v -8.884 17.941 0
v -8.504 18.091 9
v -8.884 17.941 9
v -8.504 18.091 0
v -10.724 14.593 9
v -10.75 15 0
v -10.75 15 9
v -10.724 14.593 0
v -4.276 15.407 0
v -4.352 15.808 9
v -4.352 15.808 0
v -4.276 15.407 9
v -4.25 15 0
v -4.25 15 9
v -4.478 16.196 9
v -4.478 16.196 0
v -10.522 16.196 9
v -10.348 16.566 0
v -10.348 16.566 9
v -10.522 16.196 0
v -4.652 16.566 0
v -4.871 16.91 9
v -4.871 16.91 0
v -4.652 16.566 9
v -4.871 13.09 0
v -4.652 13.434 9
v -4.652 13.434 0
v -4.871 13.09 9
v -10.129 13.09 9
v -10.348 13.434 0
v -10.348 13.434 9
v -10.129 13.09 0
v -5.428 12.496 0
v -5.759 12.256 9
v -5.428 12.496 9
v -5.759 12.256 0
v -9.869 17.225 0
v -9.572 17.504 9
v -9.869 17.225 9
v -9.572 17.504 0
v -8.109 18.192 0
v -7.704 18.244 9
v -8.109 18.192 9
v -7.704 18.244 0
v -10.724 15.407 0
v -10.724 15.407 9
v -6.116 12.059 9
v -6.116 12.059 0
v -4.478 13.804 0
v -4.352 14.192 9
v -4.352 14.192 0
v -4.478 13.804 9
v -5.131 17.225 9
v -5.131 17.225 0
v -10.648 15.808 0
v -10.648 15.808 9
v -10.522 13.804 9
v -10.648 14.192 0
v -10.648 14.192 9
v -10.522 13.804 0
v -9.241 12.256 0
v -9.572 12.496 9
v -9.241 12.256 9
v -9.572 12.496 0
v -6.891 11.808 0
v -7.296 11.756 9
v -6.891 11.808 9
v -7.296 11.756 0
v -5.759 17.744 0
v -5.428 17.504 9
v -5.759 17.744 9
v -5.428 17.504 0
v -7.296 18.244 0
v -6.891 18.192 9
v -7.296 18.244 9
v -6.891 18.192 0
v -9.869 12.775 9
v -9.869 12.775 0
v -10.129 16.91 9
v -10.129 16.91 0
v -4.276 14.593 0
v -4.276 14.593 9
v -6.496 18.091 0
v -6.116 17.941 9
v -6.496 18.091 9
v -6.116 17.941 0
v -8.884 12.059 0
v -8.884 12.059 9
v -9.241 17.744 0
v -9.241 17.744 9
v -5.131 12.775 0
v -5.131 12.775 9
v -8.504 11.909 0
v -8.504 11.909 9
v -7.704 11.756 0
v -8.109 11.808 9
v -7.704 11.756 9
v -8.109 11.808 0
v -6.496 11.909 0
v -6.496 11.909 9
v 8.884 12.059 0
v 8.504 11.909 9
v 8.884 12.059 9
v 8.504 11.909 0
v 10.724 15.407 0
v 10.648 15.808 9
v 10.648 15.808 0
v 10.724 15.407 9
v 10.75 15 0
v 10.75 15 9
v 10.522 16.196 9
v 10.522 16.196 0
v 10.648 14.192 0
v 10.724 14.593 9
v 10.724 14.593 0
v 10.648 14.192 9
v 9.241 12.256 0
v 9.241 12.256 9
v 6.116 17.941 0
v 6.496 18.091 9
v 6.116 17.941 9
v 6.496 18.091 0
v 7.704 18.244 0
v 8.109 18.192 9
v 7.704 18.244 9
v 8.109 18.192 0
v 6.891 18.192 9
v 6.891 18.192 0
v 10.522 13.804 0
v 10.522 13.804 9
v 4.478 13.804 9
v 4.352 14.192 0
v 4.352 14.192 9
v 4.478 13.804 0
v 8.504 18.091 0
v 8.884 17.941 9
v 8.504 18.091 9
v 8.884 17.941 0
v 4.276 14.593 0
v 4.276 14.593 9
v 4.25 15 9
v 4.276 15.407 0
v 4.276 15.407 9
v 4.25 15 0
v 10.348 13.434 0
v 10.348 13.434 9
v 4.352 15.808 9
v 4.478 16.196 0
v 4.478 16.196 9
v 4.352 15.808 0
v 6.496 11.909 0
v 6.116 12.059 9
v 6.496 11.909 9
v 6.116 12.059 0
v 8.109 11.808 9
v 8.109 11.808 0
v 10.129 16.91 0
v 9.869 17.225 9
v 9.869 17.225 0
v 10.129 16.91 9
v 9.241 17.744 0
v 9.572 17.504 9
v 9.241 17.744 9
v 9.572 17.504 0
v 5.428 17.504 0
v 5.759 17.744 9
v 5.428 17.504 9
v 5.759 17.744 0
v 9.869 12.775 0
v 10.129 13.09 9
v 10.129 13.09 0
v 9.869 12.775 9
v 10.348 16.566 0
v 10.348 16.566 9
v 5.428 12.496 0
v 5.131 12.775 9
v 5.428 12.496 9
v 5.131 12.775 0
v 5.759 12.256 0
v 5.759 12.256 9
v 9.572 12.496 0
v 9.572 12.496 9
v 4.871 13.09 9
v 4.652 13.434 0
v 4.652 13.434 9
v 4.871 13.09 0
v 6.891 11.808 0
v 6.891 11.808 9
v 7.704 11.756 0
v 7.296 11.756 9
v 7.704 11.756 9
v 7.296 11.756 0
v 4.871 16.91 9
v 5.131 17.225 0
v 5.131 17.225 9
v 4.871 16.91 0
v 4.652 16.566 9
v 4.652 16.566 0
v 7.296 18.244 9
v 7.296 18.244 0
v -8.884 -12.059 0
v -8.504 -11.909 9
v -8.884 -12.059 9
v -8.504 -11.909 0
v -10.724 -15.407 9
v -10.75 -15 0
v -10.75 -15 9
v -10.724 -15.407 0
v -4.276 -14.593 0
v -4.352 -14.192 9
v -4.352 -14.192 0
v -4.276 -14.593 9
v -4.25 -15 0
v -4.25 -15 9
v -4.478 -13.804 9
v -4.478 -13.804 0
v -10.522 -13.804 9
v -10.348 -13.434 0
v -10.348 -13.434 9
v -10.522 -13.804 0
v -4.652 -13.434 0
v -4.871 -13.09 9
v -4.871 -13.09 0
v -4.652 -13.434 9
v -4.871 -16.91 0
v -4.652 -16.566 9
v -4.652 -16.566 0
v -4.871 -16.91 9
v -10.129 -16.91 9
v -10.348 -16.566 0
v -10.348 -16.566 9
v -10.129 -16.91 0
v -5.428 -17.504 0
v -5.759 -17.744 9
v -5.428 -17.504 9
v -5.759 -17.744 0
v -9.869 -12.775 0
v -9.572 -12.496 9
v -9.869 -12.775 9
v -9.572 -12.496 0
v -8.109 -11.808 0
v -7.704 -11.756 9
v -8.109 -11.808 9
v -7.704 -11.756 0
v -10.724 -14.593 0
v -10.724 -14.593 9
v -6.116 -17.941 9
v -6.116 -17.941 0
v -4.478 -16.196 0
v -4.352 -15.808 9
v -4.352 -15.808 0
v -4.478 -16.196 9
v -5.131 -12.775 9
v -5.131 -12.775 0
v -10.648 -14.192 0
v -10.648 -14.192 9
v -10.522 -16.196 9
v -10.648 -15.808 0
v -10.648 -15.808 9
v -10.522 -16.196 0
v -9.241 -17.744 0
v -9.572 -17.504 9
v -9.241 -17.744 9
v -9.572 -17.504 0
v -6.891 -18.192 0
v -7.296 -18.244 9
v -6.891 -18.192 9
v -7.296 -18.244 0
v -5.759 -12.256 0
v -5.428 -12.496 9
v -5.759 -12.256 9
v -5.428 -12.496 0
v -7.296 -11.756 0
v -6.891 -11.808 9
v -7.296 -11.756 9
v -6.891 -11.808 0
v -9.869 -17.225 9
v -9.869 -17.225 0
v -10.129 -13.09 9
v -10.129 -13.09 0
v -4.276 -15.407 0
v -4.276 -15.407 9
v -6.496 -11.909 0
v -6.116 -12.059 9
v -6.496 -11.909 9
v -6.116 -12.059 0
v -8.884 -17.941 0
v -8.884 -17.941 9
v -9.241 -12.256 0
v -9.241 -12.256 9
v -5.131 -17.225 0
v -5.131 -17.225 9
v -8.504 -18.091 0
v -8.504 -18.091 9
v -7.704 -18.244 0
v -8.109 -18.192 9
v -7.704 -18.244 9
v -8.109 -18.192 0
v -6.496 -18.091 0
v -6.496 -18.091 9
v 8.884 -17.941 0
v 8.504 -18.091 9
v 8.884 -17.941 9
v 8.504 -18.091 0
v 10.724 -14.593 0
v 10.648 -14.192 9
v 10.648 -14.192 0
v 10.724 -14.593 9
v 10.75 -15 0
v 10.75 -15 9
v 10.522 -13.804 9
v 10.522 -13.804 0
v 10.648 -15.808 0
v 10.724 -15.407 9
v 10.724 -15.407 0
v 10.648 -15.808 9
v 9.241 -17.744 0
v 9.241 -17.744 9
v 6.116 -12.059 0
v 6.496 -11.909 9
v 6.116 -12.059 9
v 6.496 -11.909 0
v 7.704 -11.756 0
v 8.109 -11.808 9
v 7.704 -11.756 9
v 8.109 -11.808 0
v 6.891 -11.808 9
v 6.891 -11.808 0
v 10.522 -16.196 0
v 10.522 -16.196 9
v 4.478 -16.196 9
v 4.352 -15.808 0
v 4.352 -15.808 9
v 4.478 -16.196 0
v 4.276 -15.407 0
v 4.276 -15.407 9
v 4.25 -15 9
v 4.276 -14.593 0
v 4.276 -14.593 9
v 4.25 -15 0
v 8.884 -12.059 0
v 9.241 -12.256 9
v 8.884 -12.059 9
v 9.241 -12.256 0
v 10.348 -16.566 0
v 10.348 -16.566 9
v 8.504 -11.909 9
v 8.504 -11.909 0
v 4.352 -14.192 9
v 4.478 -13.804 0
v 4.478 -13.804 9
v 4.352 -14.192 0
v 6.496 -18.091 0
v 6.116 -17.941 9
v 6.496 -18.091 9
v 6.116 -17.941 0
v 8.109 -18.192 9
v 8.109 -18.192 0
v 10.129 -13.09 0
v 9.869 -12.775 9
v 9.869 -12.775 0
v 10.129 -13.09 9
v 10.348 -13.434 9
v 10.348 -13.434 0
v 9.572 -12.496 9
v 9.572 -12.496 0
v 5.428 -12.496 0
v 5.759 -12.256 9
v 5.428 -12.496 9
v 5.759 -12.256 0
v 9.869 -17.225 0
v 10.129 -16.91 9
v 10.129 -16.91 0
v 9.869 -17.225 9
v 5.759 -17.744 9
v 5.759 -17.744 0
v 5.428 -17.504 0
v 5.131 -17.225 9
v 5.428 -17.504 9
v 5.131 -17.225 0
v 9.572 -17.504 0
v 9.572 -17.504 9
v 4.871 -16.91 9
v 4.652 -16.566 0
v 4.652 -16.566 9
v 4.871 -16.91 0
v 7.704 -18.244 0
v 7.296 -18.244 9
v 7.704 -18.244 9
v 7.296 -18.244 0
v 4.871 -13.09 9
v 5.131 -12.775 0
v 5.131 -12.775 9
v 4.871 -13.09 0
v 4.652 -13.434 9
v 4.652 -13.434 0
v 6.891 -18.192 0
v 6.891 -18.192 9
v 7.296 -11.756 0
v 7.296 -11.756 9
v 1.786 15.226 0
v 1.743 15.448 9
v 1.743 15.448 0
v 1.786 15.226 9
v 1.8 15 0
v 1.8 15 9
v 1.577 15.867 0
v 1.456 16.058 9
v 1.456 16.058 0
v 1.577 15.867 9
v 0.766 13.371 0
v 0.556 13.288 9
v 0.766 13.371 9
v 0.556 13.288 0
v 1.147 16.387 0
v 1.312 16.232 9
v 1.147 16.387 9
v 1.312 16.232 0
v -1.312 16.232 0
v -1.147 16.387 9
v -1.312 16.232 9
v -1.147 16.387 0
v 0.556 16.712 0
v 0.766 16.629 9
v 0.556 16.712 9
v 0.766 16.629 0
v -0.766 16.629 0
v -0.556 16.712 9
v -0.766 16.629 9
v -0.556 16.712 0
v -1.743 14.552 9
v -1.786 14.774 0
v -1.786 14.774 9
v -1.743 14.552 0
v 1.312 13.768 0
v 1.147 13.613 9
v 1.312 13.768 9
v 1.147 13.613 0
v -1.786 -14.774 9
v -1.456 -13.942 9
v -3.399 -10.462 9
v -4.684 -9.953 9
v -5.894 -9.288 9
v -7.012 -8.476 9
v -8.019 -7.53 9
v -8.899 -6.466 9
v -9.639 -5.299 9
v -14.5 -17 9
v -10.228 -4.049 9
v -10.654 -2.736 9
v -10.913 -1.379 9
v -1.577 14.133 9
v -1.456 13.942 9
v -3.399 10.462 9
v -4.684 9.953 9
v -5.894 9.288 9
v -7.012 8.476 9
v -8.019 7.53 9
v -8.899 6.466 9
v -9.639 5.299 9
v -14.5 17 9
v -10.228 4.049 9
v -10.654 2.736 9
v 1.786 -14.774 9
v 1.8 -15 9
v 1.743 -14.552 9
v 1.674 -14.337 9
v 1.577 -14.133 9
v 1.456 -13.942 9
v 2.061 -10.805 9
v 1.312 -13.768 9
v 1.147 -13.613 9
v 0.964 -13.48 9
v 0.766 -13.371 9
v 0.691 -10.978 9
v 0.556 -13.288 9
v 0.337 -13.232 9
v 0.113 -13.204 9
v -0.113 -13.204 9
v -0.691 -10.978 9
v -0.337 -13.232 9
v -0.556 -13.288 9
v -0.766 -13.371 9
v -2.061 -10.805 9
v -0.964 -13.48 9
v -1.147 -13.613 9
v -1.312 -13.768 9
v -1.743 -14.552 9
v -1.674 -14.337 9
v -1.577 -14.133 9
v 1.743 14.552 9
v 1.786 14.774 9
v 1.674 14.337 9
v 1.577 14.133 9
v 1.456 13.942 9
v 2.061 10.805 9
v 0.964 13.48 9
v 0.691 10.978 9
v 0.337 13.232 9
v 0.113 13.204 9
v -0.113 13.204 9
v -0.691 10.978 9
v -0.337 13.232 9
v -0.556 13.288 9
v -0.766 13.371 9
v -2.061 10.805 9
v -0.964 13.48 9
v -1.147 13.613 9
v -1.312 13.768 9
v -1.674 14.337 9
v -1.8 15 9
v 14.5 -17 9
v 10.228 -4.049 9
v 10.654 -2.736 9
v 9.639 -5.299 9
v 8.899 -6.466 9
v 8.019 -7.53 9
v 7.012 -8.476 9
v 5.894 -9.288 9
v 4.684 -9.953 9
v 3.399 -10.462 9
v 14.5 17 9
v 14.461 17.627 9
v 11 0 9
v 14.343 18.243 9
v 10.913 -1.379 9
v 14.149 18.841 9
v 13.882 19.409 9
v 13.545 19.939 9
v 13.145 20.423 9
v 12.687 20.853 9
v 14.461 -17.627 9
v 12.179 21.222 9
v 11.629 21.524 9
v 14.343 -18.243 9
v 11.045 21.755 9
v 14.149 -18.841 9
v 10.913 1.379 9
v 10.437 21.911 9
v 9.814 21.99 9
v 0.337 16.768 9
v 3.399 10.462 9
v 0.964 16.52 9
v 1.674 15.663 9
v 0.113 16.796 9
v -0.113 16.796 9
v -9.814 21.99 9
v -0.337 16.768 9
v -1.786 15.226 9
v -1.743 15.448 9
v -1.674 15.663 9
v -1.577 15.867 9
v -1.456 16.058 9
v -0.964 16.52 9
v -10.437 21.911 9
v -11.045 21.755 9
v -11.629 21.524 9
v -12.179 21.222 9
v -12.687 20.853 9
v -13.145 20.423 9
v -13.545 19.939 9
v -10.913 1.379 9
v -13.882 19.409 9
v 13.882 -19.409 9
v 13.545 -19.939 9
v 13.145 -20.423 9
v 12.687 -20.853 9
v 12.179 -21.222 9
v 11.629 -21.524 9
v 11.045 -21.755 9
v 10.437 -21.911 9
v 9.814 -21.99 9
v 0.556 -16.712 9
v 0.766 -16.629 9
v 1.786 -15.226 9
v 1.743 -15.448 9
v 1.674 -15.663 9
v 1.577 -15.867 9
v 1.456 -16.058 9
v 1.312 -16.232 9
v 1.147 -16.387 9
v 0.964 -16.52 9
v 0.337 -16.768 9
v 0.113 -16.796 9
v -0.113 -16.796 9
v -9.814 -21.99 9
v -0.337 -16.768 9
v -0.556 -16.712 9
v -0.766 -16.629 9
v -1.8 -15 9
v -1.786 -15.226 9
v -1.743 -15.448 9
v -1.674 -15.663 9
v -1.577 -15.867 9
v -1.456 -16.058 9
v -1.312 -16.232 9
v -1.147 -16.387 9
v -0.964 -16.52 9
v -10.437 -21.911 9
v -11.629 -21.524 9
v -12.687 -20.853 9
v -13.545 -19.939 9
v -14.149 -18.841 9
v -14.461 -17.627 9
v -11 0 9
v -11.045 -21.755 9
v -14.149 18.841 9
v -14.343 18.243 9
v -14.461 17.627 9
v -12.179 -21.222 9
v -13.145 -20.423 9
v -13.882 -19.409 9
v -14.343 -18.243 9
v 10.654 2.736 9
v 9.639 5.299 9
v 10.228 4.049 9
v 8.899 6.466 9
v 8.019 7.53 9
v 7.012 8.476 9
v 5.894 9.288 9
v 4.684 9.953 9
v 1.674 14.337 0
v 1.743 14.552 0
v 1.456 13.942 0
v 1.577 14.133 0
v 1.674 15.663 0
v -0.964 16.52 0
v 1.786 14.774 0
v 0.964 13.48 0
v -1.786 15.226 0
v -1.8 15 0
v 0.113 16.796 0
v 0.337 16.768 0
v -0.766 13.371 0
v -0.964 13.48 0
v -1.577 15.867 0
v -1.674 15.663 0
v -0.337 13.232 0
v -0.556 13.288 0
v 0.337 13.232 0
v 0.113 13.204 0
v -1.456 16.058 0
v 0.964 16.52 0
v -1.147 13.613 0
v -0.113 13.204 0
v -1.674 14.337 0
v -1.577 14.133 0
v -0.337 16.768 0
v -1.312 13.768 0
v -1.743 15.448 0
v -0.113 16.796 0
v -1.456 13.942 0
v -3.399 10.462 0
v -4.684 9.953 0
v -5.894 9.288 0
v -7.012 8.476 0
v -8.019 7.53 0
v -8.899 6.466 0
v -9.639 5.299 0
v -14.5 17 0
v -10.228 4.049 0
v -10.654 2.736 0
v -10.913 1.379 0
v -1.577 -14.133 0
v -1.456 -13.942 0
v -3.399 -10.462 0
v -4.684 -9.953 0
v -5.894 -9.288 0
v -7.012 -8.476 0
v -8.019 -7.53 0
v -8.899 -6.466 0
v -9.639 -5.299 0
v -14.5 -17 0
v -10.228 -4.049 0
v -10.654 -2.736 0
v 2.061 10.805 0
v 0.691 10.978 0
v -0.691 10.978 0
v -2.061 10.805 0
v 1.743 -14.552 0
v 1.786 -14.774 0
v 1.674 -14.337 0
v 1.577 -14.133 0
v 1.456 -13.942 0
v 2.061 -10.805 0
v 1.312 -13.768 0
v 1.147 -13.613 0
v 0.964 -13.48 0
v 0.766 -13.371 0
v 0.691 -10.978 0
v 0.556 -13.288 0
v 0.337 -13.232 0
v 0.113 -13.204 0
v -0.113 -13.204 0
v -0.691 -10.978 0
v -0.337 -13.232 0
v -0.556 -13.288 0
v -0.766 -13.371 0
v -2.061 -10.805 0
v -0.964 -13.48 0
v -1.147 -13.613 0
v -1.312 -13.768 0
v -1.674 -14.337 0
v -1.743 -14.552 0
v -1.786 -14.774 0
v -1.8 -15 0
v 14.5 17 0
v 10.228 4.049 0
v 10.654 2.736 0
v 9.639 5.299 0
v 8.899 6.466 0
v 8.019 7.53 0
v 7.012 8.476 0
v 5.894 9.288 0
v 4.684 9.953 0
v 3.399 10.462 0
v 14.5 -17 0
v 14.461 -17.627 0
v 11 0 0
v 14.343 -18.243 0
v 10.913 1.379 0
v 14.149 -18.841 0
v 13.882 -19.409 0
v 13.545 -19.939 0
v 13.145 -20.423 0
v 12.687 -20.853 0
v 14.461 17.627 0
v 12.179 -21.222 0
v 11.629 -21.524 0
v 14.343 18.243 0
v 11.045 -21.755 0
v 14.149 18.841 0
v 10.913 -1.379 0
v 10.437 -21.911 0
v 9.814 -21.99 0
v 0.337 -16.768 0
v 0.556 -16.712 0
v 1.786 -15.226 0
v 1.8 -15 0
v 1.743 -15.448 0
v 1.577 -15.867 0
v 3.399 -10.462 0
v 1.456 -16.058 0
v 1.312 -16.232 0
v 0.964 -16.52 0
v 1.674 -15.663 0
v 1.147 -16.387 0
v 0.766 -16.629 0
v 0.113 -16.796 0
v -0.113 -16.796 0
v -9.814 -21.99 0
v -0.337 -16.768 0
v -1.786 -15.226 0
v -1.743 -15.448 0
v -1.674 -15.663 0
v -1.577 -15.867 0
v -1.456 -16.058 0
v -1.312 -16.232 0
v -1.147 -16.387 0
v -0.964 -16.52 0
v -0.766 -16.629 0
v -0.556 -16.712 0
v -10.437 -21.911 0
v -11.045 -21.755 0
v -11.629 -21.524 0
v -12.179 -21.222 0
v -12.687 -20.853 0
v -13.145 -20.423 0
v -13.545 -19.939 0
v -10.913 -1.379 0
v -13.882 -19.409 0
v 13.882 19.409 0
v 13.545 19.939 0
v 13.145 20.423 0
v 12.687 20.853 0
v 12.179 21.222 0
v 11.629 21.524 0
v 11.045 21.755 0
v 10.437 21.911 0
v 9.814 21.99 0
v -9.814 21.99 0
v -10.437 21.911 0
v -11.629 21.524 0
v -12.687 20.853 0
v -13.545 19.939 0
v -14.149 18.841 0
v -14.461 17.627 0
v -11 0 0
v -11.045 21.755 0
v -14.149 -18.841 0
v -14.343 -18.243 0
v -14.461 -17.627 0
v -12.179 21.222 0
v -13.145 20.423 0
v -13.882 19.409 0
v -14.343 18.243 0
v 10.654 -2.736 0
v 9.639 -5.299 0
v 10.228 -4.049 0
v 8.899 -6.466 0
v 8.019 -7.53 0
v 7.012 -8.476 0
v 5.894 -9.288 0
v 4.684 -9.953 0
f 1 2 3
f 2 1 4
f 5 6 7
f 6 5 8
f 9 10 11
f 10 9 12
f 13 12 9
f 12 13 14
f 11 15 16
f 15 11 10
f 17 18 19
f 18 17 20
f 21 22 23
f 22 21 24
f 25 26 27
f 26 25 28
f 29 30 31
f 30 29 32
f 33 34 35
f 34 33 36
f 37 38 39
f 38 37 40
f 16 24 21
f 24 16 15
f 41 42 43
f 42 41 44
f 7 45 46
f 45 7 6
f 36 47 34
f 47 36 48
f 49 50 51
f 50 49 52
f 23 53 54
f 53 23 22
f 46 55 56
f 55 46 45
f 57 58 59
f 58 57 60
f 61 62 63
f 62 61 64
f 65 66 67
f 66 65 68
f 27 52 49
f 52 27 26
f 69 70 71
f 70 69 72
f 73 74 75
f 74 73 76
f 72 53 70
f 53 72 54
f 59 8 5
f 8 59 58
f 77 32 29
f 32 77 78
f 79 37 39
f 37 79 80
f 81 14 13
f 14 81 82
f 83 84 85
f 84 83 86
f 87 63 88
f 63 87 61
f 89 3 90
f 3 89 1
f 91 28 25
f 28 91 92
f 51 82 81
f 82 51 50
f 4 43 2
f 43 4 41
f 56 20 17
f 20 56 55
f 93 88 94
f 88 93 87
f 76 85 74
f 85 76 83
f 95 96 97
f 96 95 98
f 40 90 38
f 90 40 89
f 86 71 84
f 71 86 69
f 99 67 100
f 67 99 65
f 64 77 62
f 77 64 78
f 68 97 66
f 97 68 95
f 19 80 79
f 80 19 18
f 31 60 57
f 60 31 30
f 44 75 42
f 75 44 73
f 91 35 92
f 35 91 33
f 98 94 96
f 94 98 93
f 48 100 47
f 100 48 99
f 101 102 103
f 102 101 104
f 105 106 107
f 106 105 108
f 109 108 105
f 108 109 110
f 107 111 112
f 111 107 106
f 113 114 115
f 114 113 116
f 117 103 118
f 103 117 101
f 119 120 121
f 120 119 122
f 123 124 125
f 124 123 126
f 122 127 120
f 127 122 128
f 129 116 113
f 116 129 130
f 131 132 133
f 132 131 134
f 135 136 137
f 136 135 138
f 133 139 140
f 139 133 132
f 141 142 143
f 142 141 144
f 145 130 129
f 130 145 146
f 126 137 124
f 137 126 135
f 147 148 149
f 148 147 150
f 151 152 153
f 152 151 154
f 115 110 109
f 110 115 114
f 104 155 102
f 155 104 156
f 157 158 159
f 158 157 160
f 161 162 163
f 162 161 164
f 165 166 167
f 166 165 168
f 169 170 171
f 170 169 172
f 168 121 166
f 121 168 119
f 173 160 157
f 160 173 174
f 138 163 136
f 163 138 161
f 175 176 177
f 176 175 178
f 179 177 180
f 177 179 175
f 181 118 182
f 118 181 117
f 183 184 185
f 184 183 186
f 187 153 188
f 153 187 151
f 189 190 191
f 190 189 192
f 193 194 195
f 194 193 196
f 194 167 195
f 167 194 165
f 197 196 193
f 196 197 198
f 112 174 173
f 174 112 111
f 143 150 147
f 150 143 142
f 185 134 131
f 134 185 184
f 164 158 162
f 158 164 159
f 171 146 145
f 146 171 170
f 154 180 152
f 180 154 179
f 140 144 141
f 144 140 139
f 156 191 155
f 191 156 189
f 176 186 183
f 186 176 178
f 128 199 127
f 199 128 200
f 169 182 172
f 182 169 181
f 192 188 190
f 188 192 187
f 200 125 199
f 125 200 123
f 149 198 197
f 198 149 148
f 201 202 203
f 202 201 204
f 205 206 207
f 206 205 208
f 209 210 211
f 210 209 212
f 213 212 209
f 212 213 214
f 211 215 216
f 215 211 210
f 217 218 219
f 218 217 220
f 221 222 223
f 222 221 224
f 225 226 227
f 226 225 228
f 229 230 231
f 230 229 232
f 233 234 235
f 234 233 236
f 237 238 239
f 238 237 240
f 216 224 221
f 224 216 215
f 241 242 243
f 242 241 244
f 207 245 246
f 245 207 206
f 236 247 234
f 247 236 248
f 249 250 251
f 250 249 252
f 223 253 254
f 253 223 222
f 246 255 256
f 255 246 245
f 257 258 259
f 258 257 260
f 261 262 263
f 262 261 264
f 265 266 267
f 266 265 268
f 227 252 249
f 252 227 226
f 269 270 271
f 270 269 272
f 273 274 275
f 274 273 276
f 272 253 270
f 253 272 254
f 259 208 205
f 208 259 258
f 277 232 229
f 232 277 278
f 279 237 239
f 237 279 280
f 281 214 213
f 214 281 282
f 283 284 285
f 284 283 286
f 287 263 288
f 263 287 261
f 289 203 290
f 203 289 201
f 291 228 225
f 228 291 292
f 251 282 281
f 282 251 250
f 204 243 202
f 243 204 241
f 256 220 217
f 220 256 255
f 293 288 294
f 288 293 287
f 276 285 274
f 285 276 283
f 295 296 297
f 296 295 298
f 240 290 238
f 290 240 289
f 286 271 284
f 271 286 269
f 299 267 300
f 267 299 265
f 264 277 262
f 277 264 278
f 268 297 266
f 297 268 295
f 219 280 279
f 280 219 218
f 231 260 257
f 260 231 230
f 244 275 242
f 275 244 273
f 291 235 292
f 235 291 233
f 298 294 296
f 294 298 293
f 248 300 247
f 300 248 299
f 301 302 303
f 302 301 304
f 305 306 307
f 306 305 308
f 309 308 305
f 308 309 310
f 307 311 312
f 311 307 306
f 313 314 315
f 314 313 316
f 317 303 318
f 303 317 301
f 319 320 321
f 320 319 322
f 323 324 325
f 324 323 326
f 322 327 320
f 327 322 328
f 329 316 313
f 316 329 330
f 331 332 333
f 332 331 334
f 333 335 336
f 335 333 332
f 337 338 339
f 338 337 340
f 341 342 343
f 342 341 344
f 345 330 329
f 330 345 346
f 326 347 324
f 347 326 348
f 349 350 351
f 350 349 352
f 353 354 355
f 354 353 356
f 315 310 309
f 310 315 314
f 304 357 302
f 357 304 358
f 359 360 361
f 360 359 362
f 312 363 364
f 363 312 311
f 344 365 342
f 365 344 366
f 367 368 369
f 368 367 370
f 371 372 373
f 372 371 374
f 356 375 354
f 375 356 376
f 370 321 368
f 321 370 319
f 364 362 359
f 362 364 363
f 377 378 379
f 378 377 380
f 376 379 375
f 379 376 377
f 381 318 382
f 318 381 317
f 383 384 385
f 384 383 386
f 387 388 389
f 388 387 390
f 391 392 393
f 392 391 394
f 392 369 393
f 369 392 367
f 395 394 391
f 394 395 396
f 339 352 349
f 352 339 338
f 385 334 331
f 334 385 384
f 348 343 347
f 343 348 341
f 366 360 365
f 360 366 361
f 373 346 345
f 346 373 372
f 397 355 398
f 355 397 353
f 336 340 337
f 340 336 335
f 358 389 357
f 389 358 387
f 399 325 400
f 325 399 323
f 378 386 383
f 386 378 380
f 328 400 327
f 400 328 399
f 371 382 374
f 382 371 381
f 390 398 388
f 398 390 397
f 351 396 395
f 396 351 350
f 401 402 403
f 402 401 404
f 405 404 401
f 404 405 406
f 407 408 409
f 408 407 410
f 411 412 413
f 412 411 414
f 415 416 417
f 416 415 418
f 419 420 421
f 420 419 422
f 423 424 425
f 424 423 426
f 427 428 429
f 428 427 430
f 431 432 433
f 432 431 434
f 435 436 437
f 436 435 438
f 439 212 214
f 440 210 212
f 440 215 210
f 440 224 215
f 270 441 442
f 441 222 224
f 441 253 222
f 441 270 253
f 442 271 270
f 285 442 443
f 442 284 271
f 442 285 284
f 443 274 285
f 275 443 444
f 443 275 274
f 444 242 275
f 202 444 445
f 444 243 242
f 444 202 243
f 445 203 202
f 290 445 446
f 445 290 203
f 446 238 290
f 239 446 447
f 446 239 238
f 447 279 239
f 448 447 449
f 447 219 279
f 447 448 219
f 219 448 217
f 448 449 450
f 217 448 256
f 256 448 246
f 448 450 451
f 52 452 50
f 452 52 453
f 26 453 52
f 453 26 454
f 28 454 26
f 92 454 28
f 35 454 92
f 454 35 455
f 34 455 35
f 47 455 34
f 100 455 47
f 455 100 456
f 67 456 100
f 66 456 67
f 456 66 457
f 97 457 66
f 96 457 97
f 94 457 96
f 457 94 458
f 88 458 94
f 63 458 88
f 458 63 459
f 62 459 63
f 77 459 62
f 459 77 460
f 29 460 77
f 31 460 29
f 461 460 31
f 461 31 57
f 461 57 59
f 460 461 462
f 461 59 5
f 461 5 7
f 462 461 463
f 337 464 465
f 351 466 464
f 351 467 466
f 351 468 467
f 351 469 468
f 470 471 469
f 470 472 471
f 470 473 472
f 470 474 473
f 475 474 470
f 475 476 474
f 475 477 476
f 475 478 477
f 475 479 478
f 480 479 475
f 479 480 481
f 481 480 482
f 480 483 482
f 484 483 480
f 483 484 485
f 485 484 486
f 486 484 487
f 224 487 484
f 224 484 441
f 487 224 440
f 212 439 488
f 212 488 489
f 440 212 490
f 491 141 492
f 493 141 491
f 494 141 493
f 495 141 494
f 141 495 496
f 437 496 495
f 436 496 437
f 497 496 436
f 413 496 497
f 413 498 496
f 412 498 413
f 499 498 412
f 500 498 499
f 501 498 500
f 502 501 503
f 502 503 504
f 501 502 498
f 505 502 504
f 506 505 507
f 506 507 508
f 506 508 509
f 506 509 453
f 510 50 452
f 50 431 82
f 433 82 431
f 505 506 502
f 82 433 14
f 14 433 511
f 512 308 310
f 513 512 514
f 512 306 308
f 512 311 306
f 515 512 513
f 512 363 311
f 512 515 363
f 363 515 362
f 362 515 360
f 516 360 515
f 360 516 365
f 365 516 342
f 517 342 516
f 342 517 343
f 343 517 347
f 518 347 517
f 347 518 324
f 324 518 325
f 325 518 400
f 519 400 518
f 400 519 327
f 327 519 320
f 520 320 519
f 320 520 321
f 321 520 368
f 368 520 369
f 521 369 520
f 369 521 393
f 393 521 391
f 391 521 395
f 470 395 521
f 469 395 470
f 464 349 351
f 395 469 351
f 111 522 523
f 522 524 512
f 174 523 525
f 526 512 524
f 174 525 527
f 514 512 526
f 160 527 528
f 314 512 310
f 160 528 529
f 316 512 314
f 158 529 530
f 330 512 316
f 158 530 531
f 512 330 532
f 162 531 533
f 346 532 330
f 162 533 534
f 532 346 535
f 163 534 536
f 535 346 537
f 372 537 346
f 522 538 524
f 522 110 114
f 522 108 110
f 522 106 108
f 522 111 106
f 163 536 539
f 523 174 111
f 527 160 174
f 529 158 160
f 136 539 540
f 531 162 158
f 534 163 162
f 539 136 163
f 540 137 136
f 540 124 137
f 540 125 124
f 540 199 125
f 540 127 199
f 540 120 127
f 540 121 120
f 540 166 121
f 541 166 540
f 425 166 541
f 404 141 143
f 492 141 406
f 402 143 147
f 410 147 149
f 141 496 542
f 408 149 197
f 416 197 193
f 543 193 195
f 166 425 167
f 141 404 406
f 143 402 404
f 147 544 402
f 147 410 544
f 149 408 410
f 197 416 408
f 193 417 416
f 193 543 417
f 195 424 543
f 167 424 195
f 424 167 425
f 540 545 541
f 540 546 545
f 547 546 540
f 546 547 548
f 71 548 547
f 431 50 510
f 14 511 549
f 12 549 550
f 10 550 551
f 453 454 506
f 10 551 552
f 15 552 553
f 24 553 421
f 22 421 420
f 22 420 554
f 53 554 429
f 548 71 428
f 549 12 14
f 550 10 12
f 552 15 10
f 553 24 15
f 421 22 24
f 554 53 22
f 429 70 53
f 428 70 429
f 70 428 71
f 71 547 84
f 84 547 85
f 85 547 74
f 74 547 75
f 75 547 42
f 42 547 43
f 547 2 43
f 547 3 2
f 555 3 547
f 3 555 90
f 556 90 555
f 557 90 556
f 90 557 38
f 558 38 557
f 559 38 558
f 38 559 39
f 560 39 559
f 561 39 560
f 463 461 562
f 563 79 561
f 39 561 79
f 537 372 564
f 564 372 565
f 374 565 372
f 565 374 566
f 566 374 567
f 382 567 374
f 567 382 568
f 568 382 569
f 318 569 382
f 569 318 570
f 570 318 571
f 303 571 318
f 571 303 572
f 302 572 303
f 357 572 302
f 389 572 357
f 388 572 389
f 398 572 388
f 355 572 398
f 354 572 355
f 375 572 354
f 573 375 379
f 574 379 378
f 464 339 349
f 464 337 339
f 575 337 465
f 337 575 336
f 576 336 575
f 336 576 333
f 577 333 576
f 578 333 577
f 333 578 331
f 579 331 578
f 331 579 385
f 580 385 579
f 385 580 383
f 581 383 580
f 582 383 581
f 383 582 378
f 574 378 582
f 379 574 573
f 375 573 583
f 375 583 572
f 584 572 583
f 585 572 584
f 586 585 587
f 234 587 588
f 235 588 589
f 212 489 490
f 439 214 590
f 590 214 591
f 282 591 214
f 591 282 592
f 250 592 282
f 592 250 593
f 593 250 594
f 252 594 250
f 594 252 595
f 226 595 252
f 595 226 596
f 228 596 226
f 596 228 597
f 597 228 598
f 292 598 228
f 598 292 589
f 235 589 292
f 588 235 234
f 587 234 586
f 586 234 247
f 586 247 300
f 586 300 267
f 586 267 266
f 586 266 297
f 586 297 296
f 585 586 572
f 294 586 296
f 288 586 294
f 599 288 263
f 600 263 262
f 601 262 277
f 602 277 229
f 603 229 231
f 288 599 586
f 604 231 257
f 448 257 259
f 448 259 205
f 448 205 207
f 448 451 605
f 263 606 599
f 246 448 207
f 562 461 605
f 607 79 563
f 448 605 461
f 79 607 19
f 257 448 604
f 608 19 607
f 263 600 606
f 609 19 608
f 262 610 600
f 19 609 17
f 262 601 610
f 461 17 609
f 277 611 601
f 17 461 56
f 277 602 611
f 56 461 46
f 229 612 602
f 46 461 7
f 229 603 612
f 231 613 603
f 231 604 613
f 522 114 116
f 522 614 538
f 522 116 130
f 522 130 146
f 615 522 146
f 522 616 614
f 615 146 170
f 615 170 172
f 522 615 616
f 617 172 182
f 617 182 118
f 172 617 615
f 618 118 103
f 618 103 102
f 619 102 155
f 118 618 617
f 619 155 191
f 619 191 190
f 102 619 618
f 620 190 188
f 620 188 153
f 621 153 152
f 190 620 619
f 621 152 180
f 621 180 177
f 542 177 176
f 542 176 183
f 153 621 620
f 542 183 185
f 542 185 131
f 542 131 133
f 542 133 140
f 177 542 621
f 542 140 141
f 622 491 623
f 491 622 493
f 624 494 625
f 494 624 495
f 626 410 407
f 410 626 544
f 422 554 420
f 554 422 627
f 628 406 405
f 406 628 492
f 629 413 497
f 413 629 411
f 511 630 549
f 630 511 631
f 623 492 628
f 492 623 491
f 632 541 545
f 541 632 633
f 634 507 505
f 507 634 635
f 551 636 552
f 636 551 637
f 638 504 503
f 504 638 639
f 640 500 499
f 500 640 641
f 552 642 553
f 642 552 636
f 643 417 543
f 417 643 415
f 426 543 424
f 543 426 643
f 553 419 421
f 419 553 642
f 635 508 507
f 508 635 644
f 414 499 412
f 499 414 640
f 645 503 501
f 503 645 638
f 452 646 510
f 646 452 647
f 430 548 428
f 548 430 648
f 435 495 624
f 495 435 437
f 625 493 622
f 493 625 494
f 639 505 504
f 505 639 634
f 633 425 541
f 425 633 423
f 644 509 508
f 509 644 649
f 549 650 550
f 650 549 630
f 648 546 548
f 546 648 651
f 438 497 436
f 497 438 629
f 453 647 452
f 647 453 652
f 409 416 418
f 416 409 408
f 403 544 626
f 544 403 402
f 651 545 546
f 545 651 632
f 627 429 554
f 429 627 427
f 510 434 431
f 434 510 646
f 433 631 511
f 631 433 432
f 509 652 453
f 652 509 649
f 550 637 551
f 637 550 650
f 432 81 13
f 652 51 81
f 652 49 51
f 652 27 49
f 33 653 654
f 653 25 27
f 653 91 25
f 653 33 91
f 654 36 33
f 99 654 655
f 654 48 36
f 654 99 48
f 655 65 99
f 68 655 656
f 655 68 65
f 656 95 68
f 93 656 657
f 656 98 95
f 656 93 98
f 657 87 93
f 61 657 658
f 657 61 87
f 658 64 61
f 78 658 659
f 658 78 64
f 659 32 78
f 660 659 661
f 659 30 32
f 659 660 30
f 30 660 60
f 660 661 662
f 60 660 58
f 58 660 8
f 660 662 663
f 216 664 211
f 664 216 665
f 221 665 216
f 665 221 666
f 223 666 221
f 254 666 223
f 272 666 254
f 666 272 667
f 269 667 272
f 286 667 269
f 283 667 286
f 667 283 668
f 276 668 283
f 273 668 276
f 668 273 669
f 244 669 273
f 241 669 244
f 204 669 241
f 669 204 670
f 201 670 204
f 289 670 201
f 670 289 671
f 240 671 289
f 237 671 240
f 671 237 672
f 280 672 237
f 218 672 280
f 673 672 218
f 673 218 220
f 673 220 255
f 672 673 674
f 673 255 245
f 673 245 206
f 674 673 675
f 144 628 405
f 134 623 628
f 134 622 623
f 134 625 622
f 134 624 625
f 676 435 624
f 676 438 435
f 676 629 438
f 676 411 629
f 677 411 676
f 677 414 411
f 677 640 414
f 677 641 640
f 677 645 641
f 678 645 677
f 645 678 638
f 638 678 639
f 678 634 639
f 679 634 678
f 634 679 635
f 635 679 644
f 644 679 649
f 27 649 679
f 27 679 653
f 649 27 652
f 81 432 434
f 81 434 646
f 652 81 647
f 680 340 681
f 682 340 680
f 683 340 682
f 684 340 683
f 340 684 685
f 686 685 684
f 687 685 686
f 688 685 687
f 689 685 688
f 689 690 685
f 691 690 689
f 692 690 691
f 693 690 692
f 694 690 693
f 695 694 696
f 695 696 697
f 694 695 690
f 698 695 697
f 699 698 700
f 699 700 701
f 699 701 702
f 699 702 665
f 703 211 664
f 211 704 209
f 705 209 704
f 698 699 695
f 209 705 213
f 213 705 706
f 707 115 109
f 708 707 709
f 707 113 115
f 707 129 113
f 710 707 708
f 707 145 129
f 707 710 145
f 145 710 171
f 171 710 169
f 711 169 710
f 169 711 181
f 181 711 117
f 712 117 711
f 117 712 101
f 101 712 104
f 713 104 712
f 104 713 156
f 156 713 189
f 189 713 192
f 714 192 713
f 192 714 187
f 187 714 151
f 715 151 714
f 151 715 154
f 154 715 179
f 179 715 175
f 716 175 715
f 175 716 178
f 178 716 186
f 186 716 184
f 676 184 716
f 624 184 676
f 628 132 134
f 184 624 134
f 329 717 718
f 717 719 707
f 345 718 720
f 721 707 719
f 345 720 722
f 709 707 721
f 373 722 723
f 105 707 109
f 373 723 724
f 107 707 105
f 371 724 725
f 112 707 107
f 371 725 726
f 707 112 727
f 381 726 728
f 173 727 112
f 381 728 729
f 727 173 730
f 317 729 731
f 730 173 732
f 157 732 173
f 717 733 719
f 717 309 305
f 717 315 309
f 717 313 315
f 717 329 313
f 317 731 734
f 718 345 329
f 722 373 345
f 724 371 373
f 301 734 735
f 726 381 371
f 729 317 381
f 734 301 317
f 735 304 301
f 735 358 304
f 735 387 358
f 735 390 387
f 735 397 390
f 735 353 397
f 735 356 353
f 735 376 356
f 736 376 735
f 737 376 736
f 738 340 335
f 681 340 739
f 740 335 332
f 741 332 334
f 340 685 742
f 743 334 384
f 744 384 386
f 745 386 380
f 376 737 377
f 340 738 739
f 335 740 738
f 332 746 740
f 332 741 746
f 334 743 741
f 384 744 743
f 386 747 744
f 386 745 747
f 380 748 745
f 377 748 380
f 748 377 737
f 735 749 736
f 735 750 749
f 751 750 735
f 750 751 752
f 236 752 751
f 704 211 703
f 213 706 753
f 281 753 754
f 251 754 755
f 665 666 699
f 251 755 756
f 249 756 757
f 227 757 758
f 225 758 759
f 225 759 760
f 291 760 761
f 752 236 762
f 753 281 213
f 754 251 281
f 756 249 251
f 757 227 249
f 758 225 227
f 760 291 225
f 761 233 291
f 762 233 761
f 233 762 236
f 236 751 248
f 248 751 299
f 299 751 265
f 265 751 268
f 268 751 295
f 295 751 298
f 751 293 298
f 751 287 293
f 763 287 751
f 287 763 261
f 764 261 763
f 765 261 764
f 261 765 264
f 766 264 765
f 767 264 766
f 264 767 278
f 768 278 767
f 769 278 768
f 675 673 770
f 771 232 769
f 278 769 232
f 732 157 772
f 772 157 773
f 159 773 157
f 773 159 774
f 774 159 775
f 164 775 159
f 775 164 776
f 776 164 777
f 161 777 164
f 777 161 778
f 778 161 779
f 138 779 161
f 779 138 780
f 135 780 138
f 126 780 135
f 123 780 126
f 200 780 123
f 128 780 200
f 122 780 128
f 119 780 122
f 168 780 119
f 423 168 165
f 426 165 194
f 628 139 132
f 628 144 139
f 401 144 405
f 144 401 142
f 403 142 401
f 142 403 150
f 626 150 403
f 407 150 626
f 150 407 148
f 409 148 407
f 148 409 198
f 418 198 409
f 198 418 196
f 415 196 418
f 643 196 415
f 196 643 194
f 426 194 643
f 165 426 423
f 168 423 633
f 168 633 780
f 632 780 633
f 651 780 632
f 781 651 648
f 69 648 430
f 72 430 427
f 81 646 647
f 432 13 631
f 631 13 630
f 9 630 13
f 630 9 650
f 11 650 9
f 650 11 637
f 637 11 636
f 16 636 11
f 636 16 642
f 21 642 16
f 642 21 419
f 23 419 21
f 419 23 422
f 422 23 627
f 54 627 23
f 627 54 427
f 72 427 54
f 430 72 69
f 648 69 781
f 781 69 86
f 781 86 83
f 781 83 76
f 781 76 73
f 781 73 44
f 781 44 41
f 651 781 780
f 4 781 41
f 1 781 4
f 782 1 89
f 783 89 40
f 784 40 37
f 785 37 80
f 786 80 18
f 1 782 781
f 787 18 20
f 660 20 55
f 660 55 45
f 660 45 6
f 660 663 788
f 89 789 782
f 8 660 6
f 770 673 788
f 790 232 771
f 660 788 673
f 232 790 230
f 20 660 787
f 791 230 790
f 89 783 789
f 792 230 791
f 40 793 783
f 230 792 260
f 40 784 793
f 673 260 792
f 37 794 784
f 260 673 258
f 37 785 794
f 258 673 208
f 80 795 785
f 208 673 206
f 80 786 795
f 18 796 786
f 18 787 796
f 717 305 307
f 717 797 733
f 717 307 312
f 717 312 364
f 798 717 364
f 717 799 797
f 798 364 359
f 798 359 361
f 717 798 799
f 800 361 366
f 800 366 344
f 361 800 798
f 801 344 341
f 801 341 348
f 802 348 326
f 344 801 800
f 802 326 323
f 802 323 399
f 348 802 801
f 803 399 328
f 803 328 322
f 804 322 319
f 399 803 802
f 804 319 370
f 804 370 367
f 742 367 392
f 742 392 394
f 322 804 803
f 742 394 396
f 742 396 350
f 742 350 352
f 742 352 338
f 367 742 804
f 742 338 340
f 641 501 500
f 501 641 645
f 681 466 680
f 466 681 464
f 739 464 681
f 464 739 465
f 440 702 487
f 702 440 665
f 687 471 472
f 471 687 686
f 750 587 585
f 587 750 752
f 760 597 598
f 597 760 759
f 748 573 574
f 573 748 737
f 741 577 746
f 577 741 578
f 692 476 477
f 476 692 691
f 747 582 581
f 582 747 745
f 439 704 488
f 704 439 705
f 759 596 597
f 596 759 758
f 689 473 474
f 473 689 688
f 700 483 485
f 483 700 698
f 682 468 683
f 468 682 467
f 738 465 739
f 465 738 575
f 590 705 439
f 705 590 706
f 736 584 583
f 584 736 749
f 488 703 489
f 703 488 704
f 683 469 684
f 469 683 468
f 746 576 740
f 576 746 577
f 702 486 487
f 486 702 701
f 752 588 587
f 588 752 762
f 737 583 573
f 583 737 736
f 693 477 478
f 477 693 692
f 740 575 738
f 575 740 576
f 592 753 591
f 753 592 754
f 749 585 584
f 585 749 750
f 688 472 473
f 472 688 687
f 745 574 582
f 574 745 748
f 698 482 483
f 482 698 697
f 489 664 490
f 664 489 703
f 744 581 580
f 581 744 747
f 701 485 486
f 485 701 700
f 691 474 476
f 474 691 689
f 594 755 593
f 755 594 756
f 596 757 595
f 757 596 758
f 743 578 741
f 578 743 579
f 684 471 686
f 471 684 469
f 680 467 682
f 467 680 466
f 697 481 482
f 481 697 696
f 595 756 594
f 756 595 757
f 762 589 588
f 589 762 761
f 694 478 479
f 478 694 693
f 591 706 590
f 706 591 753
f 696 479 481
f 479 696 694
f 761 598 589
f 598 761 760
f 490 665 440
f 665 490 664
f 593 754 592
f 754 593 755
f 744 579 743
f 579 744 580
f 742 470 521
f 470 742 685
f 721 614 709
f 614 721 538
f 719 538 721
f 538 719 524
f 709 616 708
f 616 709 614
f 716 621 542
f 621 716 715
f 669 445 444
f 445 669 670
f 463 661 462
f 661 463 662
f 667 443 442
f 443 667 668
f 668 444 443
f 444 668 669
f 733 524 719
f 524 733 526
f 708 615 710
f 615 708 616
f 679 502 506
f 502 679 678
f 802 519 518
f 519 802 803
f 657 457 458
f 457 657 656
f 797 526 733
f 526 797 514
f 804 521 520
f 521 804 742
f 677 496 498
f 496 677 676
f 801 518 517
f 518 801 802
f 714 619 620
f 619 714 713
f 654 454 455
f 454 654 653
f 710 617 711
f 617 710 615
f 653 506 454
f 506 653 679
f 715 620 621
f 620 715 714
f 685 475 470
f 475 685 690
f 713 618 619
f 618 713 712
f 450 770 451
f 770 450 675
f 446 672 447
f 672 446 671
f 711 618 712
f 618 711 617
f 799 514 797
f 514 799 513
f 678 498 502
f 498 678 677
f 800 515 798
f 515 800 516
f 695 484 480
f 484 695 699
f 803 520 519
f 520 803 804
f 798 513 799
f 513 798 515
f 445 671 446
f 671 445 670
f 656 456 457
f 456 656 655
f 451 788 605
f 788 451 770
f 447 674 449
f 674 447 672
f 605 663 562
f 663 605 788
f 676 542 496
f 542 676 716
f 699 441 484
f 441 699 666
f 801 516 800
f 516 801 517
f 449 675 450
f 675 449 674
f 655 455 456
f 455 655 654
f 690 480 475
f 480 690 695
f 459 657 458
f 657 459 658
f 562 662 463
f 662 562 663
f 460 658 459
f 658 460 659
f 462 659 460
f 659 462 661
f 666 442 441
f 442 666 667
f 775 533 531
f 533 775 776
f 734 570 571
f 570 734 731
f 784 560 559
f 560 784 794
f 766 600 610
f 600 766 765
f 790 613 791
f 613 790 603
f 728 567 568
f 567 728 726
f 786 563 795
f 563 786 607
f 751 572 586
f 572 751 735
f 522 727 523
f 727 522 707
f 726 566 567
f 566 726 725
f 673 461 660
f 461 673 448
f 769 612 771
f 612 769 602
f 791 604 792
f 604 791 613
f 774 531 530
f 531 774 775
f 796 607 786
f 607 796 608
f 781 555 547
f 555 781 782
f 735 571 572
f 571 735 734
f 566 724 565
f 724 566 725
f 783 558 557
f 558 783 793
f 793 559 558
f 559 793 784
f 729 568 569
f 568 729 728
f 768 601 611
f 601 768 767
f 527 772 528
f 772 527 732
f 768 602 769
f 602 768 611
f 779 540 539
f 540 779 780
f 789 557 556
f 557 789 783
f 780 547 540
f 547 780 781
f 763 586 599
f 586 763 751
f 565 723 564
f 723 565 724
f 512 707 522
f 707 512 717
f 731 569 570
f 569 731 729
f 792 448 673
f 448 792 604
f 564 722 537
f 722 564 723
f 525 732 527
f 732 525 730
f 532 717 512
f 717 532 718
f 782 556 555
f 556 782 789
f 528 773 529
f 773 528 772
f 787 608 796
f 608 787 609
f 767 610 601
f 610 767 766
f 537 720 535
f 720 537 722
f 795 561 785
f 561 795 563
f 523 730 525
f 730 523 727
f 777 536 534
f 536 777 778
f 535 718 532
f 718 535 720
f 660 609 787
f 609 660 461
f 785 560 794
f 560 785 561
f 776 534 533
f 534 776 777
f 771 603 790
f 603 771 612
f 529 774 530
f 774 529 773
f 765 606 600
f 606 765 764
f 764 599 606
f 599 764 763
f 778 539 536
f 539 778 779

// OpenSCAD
$fn = 50;


difference() {
	union() {
		hull() {
			translate(v = [-9.5000000000, 17.0000000000, 0]) {
				cylinder(h = 9, r = 5);
			}
			translate(v = [9.5000000000, 17.0000000000, 0]) {
				cylinder(h = 9, r = 5);
			}
			translate(v = [-9.5000000000, -17.0000000000, 0]) {
				cylinder(h = 9, r = 5);
			}
			translate(v = [9.5000000000, -17.0000000000, 0]) {
				cylinder(h = 9, r = 5);
			}
		}
	}
	union() {
		#translate(v = [-7.5000000000, 15.0000000000, 0]) {
			cylinder(h = 9, r = 3.2500000000);
		}
		#translate(v = [7.5000000000, 15.0000000000, 0]) {
			cylinder(h = 9, r = 3.2500000000);
		}
		#translate(v = [-7.5000000000, -15.0000000000, 0]) {
			cylinder(h = 9, r = 3.2500000000);
		}
		#translate(v = [7.5000000000, -15.0000000000, 0]) {
			cylinder(h = 9, r = 3.2500000000);
		}
		#translate(v = [-7.5000000000, -15.0000000000, -100.0000000000]) {
			cylinder(h = 200, r = 3.2500000000);
		}
		#translate(v = [-7.5000000000, 15.0000000000, -100.0000000000]) {
			cylinder(h = 200, r = 3.2500000000);
		}
		#translate(v = [7.5000000000, -15.0000000000, -100.0000000000]) {
			cylinder(h = 200, r = 3.2500000000);
		}
		#translate(v = [7.5000000000, 15.0000000000, -100.0000000000]) {
			cylinder(h = 200, r = 3.2500000000);
		}
		#translate(v = [-7.5000000000, 15.0000000000, 0]) {
			cylinder(h = 9, r = 1.8000000000);
		}
		#translate(v = [0.0000000000, 15.0000000000, 0]) {
			cylinder(h = 9, r = 1.8000000000);
		}
		#translate(v = [7.5000000000, 15.0000000000, 0]) {
			cylinder(h = 9, r = 1.8000000000);
		}
		#translate(v = [-7.5000000000, -15.0000000000, 0]) {
			cylinder(h = 9, r = 1.8000000000);
		}
		#translate(v = [0.0000000000, -15.0000000000, 0]) {
			cylinder(h = 9, r = 1.8000000000);
		}
		#translate(v = [7.5000000000, -15.0000000000, 0]) {
			cylinder(h = 9, r = 1.8000000000);
		}
		#translate(v = [-7.5000000000, 15.0000000000, 0]) {
			cylinder(h = 9, r = 1.8000000000);
		}
		#translate(v = [0.0000000000, 15.0000000000, 0]) {
			cylinder(h = 9, r = 1.8000000000);
		}
		#translate(v = [7.5000000000, 15.0000000000, 0]) {
			cylinder(h = 9, r = 1.8000000000);
		}
		#translate(v = [-7.5000000000, -15.0000000000, 0]) {
			cylinder(h = 9, r = 1.8000000000);
		}
		#translate(v = [0.0000000000, -15.0000000000, 0]) {
			cylinder(h = 9, r = 1.8000000000);
		}
		#translate(v = [7.5000000000, -15.0000000000, 0]) {
			cylinder(h = 9, r = 1.8000000000);
		}
		#translate(v = [-7.5000000000, 15.0000000000, 0]) {
			cylinder(h = 9, r = 1.8000000000);
		}
		#translate(v = [0.0000000000, 15.0000000000, 0]) {
			cylinder(h = 9, r = 1.8000000000);
		}
		#translate(v = [7.5000000000, 15.0000000000, 0]) {
			cylinder(h = 9, r = 1.8000000000);
		}
		#translate(v = [-7.5000000000, -15.0000000000, 0]) {
			cylinder(h = 9, r = 1.8000000000);
		}
		#translate(v = [0.0000000000, -15.0000000000, 0]) {
			cylinder(h = 9, r = 1.8000000000);
		}
		#translate(v = [7.5000000000, -15.0000000000, 0]) {
			cylinder(h = 9, r = 1.8000000000);
		}
		#cylinder(h = 9, r = 11.0000000000);
	}
}
